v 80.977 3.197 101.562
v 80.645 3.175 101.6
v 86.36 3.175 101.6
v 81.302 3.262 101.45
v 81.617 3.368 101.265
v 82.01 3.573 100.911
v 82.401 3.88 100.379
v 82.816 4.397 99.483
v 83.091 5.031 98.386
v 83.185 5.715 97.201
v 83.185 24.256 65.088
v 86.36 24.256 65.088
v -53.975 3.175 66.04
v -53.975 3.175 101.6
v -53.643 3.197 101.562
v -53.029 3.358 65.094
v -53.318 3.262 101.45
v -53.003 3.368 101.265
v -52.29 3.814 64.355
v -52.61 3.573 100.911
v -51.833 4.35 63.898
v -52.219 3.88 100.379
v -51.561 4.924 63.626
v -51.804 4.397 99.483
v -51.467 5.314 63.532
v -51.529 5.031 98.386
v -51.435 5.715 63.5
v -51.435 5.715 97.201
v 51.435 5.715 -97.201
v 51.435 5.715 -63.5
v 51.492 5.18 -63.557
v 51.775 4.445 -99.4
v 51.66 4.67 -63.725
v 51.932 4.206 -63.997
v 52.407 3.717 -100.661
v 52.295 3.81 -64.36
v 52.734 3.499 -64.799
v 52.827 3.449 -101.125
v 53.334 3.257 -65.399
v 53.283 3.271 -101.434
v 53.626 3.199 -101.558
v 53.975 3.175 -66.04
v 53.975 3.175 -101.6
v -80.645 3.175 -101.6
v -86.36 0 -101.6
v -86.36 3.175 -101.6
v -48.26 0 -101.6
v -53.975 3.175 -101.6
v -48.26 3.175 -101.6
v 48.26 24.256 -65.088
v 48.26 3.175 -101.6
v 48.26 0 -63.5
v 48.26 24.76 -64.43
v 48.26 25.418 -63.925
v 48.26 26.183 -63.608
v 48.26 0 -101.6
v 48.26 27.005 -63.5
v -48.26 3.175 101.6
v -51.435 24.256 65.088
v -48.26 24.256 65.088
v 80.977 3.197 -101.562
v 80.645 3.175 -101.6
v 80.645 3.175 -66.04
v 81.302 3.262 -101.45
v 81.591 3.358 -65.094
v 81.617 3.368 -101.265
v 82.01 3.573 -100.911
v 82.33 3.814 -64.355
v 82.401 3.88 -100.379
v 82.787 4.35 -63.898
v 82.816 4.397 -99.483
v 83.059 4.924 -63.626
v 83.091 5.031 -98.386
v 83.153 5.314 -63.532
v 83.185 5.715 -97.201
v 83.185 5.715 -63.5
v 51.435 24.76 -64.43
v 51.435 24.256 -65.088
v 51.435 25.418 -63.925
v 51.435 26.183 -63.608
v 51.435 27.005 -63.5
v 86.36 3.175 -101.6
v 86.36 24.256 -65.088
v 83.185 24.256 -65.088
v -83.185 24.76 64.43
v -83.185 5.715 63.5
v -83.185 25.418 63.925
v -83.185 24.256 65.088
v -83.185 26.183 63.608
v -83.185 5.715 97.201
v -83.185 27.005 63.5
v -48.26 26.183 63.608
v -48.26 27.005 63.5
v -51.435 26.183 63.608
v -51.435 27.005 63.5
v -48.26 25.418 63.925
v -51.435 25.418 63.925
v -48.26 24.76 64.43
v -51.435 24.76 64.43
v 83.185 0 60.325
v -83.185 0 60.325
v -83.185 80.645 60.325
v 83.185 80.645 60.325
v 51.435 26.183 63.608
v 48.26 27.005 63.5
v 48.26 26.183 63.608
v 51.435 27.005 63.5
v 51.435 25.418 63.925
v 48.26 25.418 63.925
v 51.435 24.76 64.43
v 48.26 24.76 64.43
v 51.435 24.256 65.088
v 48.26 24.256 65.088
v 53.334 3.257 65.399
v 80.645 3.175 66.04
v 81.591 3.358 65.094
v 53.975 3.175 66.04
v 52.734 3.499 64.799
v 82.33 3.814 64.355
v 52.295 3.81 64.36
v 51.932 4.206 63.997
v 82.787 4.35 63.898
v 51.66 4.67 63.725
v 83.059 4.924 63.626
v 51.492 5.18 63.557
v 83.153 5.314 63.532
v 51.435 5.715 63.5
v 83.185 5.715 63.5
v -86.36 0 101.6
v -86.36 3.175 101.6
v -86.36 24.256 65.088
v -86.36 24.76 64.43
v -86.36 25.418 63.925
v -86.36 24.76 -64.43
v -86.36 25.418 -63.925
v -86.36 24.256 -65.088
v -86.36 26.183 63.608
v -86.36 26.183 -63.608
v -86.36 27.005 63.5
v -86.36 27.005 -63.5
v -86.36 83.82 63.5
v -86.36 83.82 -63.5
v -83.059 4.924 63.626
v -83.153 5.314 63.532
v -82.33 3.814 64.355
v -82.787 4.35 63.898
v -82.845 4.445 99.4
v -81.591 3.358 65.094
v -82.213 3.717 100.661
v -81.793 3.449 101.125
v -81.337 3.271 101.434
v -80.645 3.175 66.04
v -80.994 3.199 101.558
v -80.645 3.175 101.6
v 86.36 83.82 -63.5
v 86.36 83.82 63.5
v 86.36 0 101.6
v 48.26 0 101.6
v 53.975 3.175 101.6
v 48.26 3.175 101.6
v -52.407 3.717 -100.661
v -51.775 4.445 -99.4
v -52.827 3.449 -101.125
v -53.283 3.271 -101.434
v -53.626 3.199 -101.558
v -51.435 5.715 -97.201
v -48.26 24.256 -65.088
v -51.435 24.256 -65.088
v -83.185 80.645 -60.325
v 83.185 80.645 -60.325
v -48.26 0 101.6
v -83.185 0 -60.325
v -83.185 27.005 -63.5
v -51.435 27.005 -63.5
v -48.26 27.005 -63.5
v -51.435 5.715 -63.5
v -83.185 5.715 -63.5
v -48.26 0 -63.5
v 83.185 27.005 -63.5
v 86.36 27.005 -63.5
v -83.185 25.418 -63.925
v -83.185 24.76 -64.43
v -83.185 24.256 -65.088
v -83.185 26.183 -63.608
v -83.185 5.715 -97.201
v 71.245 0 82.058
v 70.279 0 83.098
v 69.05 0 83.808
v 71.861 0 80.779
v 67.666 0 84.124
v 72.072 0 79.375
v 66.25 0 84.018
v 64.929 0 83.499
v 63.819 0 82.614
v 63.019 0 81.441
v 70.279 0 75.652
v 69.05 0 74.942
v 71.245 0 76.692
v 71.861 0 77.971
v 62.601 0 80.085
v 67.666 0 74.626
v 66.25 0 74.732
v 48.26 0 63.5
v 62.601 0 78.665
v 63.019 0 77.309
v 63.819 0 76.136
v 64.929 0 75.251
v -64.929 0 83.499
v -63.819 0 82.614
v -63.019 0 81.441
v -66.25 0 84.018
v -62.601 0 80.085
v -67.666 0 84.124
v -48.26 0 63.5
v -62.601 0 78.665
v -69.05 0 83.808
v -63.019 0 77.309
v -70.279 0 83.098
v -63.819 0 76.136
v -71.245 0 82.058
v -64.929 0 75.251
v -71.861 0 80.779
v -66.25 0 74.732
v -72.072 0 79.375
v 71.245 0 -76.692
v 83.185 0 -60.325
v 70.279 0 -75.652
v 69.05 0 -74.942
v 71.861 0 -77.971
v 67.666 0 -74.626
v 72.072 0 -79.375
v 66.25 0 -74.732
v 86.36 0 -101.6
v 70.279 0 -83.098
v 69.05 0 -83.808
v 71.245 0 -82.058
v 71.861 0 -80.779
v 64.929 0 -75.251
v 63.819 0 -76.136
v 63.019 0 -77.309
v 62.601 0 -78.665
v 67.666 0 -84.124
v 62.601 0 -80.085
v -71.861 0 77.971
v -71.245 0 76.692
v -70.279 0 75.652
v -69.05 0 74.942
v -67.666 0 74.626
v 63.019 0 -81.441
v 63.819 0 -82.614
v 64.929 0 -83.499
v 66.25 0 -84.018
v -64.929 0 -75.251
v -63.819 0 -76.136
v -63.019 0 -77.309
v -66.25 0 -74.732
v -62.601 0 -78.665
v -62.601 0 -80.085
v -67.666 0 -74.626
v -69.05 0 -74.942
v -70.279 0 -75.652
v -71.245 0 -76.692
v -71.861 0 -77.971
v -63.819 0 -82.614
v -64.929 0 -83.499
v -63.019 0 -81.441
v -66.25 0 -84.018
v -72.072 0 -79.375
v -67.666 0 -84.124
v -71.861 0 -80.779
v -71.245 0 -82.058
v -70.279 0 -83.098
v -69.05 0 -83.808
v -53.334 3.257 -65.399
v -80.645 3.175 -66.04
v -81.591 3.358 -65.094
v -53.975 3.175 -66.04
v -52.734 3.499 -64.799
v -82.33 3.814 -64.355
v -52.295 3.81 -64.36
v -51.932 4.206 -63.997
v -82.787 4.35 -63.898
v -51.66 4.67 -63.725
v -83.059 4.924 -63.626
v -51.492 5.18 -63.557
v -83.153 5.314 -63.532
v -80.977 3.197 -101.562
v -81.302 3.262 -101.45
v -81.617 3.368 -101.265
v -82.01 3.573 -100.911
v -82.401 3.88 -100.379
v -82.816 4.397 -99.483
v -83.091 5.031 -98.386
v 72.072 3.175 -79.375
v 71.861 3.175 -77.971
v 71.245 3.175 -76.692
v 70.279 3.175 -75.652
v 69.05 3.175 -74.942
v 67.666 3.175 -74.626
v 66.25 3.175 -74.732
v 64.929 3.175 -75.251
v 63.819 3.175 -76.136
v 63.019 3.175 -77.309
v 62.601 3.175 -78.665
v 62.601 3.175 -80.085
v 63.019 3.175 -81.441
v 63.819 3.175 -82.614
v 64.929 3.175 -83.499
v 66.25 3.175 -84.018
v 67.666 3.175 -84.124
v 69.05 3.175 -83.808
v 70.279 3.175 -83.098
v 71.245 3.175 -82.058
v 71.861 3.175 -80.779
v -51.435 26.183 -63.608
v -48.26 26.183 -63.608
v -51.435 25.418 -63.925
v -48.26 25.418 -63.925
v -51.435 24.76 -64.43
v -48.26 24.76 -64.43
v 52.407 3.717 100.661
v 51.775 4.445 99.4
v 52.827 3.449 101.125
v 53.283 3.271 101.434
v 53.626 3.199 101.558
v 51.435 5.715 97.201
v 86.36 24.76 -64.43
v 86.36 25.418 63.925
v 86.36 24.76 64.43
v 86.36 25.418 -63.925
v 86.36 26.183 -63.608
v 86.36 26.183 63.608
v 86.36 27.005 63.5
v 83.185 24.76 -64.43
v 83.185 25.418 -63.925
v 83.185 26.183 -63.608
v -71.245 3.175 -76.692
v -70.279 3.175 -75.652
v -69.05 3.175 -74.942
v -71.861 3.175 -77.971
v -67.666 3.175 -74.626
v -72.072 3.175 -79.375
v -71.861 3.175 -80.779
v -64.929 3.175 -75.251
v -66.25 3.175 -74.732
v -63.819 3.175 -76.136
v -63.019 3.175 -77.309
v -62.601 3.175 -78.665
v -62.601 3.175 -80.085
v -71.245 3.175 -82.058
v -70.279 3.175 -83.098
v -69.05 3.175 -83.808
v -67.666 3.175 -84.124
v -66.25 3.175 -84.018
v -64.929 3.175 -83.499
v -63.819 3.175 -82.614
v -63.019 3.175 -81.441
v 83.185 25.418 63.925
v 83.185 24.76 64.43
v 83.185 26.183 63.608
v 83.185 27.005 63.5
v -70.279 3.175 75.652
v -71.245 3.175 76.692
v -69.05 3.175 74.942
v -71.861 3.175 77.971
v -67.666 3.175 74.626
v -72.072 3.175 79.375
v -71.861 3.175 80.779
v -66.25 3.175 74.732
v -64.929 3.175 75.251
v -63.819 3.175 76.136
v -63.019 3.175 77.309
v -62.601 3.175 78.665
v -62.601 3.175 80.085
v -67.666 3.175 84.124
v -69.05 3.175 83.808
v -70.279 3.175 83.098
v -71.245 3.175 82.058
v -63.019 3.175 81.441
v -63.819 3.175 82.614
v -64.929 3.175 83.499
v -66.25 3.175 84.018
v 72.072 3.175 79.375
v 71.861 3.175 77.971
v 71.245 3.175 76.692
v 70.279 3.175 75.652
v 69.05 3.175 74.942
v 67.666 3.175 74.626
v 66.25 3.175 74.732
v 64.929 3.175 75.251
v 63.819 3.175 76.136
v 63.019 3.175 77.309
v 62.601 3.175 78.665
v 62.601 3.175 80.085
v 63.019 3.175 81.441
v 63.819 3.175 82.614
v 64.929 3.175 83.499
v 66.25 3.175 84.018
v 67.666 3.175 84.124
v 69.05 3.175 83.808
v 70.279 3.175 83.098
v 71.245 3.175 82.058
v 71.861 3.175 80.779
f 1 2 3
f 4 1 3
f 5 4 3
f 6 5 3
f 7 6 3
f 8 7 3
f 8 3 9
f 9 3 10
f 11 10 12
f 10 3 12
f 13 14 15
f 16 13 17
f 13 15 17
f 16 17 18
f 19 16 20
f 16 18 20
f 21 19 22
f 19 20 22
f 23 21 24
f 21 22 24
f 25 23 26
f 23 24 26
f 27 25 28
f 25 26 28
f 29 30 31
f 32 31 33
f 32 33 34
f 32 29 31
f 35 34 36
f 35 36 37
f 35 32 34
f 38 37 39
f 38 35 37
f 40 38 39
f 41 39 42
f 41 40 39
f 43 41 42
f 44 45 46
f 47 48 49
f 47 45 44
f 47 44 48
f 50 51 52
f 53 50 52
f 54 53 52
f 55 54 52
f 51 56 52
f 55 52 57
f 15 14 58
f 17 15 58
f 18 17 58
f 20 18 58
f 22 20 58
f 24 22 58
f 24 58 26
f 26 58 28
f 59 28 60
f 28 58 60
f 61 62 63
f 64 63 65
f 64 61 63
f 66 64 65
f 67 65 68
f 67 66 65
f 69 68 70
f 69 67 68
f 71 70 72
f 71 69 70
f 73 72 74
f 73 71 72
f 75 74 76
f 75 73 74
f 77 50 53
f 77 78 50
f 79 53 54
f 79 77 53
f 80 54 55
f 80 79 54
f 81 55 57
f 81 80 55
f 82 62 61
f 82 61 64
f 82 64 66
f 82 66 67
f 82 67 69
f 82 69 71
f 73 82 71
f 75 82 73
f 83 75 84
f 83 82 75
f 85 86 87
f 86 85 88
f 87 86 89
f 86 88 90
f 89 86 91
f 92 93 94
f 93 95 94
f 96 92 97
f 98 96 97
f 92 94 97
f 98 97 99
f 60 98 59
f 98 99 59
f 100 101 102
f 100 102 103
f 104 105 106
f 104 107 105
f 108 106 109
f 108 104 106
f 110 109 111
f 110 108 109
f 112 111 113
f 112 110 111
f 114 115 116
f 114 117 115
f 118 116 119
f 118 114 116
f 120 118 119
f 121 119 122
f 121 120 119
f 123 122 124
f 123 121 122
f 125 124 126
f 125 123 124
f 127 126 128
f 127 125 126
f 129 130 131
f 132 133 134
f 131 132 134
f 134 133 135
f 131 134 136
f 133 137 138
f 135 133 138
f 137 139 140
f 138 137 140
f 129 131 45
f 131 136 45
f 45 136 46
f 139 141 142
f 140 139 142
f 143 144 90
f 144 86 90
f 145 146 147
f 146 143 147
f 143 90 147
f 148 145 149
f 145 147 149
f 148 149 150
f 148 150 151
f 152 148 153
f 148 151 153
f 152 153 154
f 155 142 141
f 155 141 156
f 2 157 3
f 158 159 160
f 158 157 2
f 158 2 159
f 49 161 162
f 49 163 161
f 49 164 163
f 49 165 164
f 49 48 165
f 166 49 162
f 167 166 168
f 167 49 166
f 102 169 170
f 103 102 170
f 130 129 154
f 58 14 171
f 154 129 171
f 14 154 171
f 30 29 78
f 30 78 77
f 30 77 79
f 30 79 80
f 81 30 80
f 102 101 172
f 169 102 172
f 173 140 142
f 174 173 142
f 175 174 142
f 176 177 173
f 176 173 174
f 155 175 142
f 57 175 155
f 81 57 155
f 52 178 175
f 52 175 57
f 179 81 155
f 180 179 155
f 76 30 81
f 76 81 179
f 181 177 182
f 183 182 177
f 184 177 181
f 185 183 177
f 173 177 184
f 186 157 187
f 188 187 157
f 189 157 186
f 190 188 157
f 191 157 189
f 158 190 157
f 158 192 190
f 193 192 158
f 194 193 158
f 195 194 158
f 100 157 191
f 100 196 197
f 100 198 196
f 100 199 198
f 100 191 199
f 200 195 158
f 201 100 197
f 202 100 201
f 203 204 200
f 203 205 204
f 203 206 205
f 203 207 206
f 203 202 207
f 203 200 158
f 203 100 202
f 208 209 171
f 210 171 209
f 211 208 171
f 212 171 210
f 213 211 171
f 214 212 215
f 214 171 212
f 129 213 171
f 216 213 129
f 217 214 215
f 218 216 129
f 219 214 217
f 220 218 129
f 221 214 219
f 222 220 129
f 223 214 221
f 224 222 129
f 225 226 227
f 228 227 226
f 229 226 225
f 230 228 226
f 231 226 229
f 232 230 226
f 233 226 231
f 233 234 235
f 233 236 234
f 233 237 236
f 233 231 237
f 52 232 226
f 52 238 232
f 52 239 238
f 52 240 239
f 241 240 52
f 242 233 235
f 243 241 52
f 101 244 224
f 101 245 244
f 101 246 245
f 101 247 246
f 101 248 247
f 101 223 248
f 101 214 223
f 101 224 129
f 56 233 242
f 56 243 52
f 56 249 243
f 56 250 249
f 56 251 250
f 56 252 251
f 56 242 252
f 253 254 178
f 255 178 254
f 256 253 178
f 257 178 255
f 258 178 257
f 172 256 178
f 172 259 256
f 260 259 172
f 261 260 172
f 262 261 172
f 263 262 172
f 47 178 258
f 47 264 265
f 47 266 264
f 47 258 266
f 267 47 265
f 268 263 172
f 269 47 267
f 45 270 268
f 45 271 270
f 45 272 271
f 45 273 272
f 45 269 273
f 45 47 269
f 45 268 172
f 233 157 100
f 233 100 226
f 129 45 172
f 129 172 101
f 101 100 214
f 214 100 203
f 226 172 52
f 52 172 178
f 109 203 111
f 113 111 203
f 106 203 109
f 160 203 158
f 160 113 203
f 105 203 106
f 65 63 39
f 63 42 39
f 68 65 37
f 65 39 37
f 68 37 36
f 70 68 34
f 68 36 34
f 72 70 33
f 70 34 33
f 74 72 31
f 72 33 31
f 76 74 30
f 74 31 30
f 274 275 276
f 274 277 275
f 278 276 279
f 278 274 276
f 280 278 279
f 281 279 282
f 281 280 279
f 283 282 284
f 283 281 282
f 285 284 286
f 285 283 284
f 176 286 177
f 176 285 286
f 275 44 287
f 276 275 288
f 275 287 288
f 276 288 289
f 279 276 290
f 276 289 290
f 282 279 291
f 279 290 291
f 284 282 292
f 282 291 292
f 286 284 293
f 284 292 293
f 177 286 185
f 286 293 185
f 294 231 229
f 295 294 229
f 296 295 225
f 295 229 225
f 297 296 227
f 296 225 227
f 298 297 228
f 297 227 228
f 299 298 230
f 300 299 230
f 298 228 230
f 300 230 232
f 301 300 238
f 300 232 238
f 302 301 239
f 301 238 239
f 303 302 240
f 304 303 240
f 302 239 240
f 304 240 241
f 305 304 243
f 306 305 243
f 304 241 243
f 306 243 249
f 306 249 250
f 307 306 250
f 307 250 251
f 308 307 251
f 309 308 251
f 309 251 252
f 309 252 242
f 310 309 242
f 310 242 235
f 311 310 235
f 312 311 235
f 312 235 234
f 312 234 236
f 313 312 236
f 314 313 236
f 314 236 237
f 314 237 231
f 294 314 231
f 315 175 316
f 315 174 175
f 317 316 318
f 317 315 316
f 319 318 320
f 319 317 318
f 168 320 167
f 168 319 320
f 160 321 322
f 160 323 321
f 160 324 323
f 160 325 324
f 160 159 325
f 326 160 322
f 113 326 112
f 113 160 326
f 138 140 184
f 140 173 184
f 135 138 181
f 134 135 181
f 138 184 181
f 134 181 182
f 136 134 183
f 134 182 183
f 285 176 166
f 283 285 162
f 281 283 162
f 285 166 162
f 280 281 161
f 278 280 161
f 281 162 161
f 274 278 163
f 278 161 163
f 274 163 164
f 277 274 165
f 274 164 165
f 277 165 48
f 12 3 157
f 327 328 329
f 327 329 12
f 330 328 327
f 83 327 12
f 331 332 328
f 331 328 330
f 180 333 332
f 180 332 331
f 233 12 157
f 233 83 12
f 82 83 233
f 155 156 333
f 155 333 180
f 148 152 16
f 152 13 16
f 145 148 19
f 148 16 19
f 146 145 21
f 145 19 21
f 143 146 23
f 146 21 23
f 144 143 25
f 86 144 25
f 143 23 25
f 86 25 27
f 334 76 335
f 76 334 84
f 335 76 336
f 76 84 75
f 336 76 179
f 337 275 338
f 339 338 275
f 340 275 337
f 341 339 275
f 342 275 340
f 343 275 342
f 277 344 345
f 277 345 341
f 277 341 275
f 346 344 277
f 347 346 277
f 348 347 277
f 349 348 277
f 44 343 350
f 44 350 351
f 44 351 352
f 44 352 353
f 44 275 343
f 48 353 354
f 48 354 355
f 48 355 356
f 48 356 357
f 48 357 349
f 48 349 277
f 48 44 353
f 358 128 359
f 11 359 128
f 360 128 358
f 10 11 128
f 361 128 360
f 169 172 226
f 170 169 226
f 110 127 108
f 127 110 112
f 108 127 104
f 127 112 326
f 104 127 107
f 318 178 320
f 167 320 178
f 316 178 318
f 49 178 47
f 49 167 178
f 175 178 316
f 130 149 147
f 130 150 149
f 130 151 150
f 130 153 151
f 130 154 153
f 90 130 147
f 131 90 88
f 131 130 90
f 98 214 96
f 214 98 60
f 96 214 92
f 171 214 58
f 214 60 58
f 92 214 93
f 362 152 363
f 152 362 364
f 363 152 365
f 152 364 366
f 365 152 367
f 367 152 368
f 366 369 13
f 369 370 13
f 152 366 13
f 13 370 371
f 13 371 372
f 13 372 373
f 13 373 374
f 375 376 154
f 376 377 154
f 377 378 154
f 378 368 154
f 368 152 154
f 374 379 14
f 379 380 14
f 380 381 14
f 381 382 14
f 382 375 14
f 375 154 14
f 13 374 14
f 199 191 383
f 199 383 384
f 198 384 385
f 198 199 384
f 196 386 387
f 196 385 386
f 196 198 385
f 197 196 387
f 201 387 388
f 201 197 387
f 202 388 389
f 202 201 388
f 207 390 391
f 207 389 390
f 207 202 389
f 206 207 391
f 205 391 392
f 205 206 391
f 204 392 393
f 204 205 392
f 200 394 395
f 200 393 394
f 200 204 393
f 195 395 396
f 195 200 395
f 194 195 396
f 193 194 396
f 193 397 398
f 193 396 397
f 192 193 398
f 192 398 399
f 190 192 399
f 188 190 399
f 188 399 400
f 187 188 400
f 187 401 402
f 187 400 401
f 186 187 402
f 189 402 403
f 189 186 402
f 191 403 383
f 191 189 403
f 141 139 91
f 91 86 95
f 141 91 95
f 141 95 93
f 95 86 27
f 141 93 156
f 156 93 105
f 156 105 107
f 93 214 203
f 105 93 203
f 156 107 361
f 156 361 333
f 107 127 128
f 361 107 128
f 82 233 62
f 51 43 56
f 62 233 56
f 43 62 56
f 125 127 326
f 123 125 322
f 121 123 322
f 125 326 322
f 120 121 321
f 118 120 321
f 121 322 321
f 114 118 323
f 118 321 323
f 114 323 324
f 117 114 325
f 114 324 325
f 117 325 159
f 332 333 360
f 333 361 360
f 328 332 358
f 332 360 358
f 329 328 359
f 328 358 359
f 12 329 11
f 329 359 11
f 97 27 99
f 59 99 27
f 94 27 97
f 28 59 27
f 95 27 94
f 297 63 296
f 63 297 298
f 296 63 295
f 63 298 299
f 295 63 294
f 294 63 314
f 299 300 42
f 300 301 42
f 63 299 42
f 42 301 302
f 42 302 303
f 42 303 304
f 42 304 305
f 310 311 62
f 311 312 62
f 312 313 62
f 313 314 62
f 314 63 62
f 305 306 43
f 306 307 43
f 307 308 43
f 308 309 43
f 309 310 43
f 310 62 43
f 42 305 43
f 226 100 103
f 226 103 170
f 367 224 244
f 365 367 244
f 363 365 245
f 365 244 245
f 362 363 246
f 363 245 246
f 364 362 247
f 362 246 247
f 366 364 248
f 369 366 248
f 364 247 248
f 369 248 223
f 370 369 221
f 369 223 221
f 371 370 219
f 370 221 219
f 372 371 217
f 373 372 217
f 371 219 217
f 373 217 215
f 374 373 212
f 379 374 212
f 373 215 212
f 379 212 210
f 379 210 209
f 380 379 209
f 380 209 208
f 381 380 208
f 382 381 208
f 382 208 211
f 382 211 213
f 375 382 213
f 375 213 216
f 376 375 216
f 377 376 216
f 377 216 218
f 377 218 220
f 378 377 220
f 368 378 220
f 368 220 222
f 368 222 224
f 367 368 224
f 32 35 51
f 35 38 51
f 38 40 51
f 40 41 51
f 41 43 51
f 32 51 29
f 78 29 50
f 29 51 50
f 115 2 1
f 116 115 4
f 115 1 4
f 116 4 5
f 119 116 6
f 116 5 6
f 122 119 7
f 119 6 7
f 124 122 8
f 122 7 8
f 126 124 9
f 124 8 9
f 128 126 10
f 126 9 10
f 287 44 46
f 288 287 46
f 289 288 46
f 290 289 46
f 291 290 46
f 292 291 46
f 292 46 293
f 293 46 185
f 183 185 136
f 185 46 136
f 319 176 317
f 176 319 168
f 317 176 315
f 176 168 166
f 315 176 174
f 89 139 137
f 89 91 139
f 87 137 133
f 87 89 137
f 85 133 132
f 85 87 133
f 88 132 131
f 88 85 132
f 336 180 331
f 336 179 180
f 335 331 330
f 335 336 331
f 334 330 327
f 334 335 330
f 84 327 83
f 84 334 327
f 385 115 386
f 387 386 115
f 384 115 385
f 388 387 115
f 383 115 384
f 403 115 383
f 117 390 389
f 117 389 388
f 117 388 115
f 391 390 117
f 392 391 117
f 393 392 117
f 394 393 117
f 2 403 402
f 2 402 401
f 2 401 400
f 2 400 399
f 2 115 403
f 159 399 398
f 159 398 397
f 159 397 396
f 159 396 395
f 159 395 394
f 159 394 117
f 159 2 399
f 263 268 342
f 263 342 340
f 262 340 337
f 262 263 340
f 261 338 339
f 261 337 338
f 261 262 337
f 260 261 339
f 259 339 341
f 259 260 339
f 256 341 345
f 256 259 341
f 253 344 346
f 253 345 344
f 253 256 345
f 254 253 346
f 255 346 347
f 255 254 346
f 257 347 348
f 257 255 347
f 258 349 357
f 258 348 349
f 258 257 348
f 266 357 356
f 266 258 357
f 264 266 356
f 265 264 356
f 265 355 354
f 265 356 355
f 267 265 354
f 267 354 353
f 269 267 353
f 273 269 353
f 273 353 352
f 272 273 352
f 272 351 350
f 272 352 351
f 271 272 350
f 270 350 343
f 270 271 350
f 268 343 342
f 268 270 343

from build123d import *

# Parameters (mm, degrees)
SKETCH1_W                    = 172.72
SKETCH1_H                    = 127
BOSS_EXTRUDE1_DEPTH          = 83.82
SHELL1_T                     = -3.175
SKETCH6_W                    = 38.1
SKETCH6_H                    = 38.1
BOSS_EXTRUDE4_DEPTH          = 3.175
BOSS_EXTRUDE5_DEPTH          = 3.175
MIRROR5_COPY_1_DEPTH         = 3.175
MIRROR6_COPY_1_DEPTH         = 3.175
MIRROR6_COPY_2_SKETCH_W      = 38.1
MIRROR6_COPY_2_SKETCH_H      = 38.1
MIRROR6_COPY_2_DEPTH         = 3.175
MIRROR6_COPY_3_DEPTH         = 3.175
MIRROR6_COPY_4_DEPTH         = 3.175
FILLET3_R                    = 2.54
F_3_8_0_375_DIAMETER_HOLE1_D = 9.525
MIRROR8_COPY_1_D             = 9.525
FILLET4_R                    = 3.175


with BuildPart() as part:
    # Sketch1 → Boss-Extrude1 (new body)
    with BuildSketch(Plane(origin=(0, 0, 0), x_dir=(1, 0, 0), z_dir=(0, 1, 0))):
        Rectangle(SKETCH1_W, SKETCH1_H)
    extrude(amount=BOSS_EXTRUDE1_DEPTH)

    # Shell1
    shell1_openings = [part.faces().sort_by_distance(p)[0] for p in [
        (0, 0, 0),
    ]]
    offset(amount=SHELL1_T, openings=shell1_openings, kind=Kind.INTERSECTION)

    # Sketch6 → Boss-Extrude4 (add)
    with BuildSketch(Plane.XZ):
        with Locations((-67.31, 82.55)):
            Rectangle(SKETCH6_W, SKETCH6_H)
    boss_extrude4 = extrude(amount=-BOSS_EXTRUDE4_DEPTH)

    # Sketch7 → Boss-Extrude5 (add)
    with BuildSketch(Plane.ZY.offset(86.36)):
        Polygon((101.6, 3.175), (63.5, 25.172045256), (63.5, 3.175), align=None)
    boss_extrude5 = extrude(amount=-BOSS_EXTRUDE5_DEPTH)

    # Mirror4: Boss-Extrude5 across plane
    add(boss_extrude5.mirror(Plane.ZY.offset(67.31)))

    # Mirror5: Boss-Extrude4, Boss-Extrude5 across plane
    add(boss_extrude4.mirror(Plane.XY))
    add(boss_extrude5.mirror(Plane.XY))

    # Mirror5 copy 1 sketch → Mirror5 copy 1 (add)
    with BuildSketch(Plane(origin=(-48.26, 0, 0), x_dir=(0, 0, -1), z_dir=(1, 0, 0))):
        Polygon((101.6, 3.175), (63.5, 25.172045256), (63.5, 3.175), align=None)
    extrude(amount=-MIRROR5_COPY_1_DEPTH)

    # Mirror6: Boss-Extrude4, Boss-Extrude5 across plane
    add(boss_extrude4.mirror(Plane(origin=(0, 0, 0), x_dir=(0, 0, 1), z_dir=(1, 0, 0))))
    add(boss_extrude5.mirror(Plane(origin=(0, 0, 0), x_dir=(0, 0, 1), z_dir=(1, 0, 0))))

    # Mirror6 copy 1 sketch → Mirror6 copy 1 (add)
    with BuildSketch(Plane.ZY.offset(-48.26)):
        Polygon((101.6, 3.175), (63.5, 25.172045256), (63.5, 3.175), align=None)
    extrude(amount=-MIRROR6_COPY_1_DEPTH)

    # Mirror6 copy 2 sketch → Mirror6 copy 2 (add)
    with BuildSketch(Plane(origin=(0, 0, 0), x_dir=(-1, 0, 0), z_dir=(0, -1, 0))):
        with Locations((-67.31, 82.55)):
            Rectangle(MIRROR6_COPY_2_SKETCH_W, MIRROR6_COPY_2_SKETCH_H)
    extrude(amount=-MIRROR6_COPY_2_DEPTH)

    # Mirror6 copy 3 sketch → Mirror6 copy 3 (add)
    with BuildSketch(Plane(origin=(86.36, 0, 0), x_dir=(0, 0, -1), z_dir=(1, 0, 0))):
        Polygon((101.6, 3.175), (63.5, 25.172045256), (63.5, 3.175), align=None)
    extrude(amount=-MIRROR6_COPY_3_DEPTH)

    # Mirror6 copy 4 sketch → Mirror6 copy 4 (add)
    with BuildSketch(Plane(origin=(48.26, 0, 0), x_dir=(0, 0, -1), z_dir=(-1, 0, 0))):
        Polygon((101.6, -3.175), (63.5, -25.172045256), (63.5, -3.175), align=None)
    extrude(amount=-MIRROR6_COPY_4_DEPTH)

    # Fillet3
    fillet3_edges = [part.edges().sort_by_distance(p)[0] for p in [
        (51.435, 3.175, -82.55),
        (67.31, 3.175, -63.5),
        (83.185, 3.175, -82.55),
        (51.435, 3.175, 82.55),
        (67.31, 3.175, 63.5),
        (83.185, 3.175, 82.55),
        (-67.31, 3.175, 63.5),
        (-83.185, 3.175, 82.55),
        (-51.435, 3.175, 82.55),
        (-51.435, 3.175, -82.55),
        (-67.31, 3.175, -63.5),
        (-83.185, 3.175, -82.55),
    ]]
    fillet(fillet3_edges, radius=FILLET3_R)

    # 3/8 (0.375) Diameter Hole1 (through all)
    with Locations(Plane(origin=(0, 3.175, 0), x_dir=(1, 0, 0), z_dir=(0, 1, 0))):
        with Locations((-67.31, -79.375)):
            f_3_8_0_375_diameter_hole1 = Hole(F_3_8_0_375_DIAMETER_HOLE1_D / 2)

    # Mirror7: 3/8 (0.375) Diameter Hole1 across plane
    add(f_3_8_0_375_diameter_hole1.mirror(Plane.XY), mode=Mode.SUBTRACT)

    # Mirror8: 3/8 (0.375) Diameter Hole1 across plane
    add(f_3_8_0_375_diameter_hole1.mirror(Plane(origin=(0, 0, 0), x_dir=(0, 0, 1), z_dir=(1, 0, 0))), mode=Mode.SUBTRACT)

    # Mirror8 copy 1 (through all)
    with Locations(Plane(origin=(0, 3.175, 0), x_dir=(-1, 0, 0), z_dir=(0, 1, 0))):
        with Locations((-67.31, -79.375)):
            Hole(MIRROR8_COPY_1_D / 2)

    # Fillet4
    fillet4_edges = [part.edges().sort_by_distance(p)[0] for p in [
        (49.8475, 25.172045256, -63.5),
        (84.7725, 25.172045256, -63.5),
        (49.8475, 25.172045256, 63.5),
        (84.7725, 25.172045256, 63.5),
        (-84.7725, 25.172045256, 63.5),
        (-49.8475, 25.172045256, 63.5),
        (-49.8475, 25.172045256, -63.5),
        (-84.7725, 25.172045256, -63.5),
    ]]
    fillet(fillet4_edges, radius=FILLET4_R)


solid = part.part
